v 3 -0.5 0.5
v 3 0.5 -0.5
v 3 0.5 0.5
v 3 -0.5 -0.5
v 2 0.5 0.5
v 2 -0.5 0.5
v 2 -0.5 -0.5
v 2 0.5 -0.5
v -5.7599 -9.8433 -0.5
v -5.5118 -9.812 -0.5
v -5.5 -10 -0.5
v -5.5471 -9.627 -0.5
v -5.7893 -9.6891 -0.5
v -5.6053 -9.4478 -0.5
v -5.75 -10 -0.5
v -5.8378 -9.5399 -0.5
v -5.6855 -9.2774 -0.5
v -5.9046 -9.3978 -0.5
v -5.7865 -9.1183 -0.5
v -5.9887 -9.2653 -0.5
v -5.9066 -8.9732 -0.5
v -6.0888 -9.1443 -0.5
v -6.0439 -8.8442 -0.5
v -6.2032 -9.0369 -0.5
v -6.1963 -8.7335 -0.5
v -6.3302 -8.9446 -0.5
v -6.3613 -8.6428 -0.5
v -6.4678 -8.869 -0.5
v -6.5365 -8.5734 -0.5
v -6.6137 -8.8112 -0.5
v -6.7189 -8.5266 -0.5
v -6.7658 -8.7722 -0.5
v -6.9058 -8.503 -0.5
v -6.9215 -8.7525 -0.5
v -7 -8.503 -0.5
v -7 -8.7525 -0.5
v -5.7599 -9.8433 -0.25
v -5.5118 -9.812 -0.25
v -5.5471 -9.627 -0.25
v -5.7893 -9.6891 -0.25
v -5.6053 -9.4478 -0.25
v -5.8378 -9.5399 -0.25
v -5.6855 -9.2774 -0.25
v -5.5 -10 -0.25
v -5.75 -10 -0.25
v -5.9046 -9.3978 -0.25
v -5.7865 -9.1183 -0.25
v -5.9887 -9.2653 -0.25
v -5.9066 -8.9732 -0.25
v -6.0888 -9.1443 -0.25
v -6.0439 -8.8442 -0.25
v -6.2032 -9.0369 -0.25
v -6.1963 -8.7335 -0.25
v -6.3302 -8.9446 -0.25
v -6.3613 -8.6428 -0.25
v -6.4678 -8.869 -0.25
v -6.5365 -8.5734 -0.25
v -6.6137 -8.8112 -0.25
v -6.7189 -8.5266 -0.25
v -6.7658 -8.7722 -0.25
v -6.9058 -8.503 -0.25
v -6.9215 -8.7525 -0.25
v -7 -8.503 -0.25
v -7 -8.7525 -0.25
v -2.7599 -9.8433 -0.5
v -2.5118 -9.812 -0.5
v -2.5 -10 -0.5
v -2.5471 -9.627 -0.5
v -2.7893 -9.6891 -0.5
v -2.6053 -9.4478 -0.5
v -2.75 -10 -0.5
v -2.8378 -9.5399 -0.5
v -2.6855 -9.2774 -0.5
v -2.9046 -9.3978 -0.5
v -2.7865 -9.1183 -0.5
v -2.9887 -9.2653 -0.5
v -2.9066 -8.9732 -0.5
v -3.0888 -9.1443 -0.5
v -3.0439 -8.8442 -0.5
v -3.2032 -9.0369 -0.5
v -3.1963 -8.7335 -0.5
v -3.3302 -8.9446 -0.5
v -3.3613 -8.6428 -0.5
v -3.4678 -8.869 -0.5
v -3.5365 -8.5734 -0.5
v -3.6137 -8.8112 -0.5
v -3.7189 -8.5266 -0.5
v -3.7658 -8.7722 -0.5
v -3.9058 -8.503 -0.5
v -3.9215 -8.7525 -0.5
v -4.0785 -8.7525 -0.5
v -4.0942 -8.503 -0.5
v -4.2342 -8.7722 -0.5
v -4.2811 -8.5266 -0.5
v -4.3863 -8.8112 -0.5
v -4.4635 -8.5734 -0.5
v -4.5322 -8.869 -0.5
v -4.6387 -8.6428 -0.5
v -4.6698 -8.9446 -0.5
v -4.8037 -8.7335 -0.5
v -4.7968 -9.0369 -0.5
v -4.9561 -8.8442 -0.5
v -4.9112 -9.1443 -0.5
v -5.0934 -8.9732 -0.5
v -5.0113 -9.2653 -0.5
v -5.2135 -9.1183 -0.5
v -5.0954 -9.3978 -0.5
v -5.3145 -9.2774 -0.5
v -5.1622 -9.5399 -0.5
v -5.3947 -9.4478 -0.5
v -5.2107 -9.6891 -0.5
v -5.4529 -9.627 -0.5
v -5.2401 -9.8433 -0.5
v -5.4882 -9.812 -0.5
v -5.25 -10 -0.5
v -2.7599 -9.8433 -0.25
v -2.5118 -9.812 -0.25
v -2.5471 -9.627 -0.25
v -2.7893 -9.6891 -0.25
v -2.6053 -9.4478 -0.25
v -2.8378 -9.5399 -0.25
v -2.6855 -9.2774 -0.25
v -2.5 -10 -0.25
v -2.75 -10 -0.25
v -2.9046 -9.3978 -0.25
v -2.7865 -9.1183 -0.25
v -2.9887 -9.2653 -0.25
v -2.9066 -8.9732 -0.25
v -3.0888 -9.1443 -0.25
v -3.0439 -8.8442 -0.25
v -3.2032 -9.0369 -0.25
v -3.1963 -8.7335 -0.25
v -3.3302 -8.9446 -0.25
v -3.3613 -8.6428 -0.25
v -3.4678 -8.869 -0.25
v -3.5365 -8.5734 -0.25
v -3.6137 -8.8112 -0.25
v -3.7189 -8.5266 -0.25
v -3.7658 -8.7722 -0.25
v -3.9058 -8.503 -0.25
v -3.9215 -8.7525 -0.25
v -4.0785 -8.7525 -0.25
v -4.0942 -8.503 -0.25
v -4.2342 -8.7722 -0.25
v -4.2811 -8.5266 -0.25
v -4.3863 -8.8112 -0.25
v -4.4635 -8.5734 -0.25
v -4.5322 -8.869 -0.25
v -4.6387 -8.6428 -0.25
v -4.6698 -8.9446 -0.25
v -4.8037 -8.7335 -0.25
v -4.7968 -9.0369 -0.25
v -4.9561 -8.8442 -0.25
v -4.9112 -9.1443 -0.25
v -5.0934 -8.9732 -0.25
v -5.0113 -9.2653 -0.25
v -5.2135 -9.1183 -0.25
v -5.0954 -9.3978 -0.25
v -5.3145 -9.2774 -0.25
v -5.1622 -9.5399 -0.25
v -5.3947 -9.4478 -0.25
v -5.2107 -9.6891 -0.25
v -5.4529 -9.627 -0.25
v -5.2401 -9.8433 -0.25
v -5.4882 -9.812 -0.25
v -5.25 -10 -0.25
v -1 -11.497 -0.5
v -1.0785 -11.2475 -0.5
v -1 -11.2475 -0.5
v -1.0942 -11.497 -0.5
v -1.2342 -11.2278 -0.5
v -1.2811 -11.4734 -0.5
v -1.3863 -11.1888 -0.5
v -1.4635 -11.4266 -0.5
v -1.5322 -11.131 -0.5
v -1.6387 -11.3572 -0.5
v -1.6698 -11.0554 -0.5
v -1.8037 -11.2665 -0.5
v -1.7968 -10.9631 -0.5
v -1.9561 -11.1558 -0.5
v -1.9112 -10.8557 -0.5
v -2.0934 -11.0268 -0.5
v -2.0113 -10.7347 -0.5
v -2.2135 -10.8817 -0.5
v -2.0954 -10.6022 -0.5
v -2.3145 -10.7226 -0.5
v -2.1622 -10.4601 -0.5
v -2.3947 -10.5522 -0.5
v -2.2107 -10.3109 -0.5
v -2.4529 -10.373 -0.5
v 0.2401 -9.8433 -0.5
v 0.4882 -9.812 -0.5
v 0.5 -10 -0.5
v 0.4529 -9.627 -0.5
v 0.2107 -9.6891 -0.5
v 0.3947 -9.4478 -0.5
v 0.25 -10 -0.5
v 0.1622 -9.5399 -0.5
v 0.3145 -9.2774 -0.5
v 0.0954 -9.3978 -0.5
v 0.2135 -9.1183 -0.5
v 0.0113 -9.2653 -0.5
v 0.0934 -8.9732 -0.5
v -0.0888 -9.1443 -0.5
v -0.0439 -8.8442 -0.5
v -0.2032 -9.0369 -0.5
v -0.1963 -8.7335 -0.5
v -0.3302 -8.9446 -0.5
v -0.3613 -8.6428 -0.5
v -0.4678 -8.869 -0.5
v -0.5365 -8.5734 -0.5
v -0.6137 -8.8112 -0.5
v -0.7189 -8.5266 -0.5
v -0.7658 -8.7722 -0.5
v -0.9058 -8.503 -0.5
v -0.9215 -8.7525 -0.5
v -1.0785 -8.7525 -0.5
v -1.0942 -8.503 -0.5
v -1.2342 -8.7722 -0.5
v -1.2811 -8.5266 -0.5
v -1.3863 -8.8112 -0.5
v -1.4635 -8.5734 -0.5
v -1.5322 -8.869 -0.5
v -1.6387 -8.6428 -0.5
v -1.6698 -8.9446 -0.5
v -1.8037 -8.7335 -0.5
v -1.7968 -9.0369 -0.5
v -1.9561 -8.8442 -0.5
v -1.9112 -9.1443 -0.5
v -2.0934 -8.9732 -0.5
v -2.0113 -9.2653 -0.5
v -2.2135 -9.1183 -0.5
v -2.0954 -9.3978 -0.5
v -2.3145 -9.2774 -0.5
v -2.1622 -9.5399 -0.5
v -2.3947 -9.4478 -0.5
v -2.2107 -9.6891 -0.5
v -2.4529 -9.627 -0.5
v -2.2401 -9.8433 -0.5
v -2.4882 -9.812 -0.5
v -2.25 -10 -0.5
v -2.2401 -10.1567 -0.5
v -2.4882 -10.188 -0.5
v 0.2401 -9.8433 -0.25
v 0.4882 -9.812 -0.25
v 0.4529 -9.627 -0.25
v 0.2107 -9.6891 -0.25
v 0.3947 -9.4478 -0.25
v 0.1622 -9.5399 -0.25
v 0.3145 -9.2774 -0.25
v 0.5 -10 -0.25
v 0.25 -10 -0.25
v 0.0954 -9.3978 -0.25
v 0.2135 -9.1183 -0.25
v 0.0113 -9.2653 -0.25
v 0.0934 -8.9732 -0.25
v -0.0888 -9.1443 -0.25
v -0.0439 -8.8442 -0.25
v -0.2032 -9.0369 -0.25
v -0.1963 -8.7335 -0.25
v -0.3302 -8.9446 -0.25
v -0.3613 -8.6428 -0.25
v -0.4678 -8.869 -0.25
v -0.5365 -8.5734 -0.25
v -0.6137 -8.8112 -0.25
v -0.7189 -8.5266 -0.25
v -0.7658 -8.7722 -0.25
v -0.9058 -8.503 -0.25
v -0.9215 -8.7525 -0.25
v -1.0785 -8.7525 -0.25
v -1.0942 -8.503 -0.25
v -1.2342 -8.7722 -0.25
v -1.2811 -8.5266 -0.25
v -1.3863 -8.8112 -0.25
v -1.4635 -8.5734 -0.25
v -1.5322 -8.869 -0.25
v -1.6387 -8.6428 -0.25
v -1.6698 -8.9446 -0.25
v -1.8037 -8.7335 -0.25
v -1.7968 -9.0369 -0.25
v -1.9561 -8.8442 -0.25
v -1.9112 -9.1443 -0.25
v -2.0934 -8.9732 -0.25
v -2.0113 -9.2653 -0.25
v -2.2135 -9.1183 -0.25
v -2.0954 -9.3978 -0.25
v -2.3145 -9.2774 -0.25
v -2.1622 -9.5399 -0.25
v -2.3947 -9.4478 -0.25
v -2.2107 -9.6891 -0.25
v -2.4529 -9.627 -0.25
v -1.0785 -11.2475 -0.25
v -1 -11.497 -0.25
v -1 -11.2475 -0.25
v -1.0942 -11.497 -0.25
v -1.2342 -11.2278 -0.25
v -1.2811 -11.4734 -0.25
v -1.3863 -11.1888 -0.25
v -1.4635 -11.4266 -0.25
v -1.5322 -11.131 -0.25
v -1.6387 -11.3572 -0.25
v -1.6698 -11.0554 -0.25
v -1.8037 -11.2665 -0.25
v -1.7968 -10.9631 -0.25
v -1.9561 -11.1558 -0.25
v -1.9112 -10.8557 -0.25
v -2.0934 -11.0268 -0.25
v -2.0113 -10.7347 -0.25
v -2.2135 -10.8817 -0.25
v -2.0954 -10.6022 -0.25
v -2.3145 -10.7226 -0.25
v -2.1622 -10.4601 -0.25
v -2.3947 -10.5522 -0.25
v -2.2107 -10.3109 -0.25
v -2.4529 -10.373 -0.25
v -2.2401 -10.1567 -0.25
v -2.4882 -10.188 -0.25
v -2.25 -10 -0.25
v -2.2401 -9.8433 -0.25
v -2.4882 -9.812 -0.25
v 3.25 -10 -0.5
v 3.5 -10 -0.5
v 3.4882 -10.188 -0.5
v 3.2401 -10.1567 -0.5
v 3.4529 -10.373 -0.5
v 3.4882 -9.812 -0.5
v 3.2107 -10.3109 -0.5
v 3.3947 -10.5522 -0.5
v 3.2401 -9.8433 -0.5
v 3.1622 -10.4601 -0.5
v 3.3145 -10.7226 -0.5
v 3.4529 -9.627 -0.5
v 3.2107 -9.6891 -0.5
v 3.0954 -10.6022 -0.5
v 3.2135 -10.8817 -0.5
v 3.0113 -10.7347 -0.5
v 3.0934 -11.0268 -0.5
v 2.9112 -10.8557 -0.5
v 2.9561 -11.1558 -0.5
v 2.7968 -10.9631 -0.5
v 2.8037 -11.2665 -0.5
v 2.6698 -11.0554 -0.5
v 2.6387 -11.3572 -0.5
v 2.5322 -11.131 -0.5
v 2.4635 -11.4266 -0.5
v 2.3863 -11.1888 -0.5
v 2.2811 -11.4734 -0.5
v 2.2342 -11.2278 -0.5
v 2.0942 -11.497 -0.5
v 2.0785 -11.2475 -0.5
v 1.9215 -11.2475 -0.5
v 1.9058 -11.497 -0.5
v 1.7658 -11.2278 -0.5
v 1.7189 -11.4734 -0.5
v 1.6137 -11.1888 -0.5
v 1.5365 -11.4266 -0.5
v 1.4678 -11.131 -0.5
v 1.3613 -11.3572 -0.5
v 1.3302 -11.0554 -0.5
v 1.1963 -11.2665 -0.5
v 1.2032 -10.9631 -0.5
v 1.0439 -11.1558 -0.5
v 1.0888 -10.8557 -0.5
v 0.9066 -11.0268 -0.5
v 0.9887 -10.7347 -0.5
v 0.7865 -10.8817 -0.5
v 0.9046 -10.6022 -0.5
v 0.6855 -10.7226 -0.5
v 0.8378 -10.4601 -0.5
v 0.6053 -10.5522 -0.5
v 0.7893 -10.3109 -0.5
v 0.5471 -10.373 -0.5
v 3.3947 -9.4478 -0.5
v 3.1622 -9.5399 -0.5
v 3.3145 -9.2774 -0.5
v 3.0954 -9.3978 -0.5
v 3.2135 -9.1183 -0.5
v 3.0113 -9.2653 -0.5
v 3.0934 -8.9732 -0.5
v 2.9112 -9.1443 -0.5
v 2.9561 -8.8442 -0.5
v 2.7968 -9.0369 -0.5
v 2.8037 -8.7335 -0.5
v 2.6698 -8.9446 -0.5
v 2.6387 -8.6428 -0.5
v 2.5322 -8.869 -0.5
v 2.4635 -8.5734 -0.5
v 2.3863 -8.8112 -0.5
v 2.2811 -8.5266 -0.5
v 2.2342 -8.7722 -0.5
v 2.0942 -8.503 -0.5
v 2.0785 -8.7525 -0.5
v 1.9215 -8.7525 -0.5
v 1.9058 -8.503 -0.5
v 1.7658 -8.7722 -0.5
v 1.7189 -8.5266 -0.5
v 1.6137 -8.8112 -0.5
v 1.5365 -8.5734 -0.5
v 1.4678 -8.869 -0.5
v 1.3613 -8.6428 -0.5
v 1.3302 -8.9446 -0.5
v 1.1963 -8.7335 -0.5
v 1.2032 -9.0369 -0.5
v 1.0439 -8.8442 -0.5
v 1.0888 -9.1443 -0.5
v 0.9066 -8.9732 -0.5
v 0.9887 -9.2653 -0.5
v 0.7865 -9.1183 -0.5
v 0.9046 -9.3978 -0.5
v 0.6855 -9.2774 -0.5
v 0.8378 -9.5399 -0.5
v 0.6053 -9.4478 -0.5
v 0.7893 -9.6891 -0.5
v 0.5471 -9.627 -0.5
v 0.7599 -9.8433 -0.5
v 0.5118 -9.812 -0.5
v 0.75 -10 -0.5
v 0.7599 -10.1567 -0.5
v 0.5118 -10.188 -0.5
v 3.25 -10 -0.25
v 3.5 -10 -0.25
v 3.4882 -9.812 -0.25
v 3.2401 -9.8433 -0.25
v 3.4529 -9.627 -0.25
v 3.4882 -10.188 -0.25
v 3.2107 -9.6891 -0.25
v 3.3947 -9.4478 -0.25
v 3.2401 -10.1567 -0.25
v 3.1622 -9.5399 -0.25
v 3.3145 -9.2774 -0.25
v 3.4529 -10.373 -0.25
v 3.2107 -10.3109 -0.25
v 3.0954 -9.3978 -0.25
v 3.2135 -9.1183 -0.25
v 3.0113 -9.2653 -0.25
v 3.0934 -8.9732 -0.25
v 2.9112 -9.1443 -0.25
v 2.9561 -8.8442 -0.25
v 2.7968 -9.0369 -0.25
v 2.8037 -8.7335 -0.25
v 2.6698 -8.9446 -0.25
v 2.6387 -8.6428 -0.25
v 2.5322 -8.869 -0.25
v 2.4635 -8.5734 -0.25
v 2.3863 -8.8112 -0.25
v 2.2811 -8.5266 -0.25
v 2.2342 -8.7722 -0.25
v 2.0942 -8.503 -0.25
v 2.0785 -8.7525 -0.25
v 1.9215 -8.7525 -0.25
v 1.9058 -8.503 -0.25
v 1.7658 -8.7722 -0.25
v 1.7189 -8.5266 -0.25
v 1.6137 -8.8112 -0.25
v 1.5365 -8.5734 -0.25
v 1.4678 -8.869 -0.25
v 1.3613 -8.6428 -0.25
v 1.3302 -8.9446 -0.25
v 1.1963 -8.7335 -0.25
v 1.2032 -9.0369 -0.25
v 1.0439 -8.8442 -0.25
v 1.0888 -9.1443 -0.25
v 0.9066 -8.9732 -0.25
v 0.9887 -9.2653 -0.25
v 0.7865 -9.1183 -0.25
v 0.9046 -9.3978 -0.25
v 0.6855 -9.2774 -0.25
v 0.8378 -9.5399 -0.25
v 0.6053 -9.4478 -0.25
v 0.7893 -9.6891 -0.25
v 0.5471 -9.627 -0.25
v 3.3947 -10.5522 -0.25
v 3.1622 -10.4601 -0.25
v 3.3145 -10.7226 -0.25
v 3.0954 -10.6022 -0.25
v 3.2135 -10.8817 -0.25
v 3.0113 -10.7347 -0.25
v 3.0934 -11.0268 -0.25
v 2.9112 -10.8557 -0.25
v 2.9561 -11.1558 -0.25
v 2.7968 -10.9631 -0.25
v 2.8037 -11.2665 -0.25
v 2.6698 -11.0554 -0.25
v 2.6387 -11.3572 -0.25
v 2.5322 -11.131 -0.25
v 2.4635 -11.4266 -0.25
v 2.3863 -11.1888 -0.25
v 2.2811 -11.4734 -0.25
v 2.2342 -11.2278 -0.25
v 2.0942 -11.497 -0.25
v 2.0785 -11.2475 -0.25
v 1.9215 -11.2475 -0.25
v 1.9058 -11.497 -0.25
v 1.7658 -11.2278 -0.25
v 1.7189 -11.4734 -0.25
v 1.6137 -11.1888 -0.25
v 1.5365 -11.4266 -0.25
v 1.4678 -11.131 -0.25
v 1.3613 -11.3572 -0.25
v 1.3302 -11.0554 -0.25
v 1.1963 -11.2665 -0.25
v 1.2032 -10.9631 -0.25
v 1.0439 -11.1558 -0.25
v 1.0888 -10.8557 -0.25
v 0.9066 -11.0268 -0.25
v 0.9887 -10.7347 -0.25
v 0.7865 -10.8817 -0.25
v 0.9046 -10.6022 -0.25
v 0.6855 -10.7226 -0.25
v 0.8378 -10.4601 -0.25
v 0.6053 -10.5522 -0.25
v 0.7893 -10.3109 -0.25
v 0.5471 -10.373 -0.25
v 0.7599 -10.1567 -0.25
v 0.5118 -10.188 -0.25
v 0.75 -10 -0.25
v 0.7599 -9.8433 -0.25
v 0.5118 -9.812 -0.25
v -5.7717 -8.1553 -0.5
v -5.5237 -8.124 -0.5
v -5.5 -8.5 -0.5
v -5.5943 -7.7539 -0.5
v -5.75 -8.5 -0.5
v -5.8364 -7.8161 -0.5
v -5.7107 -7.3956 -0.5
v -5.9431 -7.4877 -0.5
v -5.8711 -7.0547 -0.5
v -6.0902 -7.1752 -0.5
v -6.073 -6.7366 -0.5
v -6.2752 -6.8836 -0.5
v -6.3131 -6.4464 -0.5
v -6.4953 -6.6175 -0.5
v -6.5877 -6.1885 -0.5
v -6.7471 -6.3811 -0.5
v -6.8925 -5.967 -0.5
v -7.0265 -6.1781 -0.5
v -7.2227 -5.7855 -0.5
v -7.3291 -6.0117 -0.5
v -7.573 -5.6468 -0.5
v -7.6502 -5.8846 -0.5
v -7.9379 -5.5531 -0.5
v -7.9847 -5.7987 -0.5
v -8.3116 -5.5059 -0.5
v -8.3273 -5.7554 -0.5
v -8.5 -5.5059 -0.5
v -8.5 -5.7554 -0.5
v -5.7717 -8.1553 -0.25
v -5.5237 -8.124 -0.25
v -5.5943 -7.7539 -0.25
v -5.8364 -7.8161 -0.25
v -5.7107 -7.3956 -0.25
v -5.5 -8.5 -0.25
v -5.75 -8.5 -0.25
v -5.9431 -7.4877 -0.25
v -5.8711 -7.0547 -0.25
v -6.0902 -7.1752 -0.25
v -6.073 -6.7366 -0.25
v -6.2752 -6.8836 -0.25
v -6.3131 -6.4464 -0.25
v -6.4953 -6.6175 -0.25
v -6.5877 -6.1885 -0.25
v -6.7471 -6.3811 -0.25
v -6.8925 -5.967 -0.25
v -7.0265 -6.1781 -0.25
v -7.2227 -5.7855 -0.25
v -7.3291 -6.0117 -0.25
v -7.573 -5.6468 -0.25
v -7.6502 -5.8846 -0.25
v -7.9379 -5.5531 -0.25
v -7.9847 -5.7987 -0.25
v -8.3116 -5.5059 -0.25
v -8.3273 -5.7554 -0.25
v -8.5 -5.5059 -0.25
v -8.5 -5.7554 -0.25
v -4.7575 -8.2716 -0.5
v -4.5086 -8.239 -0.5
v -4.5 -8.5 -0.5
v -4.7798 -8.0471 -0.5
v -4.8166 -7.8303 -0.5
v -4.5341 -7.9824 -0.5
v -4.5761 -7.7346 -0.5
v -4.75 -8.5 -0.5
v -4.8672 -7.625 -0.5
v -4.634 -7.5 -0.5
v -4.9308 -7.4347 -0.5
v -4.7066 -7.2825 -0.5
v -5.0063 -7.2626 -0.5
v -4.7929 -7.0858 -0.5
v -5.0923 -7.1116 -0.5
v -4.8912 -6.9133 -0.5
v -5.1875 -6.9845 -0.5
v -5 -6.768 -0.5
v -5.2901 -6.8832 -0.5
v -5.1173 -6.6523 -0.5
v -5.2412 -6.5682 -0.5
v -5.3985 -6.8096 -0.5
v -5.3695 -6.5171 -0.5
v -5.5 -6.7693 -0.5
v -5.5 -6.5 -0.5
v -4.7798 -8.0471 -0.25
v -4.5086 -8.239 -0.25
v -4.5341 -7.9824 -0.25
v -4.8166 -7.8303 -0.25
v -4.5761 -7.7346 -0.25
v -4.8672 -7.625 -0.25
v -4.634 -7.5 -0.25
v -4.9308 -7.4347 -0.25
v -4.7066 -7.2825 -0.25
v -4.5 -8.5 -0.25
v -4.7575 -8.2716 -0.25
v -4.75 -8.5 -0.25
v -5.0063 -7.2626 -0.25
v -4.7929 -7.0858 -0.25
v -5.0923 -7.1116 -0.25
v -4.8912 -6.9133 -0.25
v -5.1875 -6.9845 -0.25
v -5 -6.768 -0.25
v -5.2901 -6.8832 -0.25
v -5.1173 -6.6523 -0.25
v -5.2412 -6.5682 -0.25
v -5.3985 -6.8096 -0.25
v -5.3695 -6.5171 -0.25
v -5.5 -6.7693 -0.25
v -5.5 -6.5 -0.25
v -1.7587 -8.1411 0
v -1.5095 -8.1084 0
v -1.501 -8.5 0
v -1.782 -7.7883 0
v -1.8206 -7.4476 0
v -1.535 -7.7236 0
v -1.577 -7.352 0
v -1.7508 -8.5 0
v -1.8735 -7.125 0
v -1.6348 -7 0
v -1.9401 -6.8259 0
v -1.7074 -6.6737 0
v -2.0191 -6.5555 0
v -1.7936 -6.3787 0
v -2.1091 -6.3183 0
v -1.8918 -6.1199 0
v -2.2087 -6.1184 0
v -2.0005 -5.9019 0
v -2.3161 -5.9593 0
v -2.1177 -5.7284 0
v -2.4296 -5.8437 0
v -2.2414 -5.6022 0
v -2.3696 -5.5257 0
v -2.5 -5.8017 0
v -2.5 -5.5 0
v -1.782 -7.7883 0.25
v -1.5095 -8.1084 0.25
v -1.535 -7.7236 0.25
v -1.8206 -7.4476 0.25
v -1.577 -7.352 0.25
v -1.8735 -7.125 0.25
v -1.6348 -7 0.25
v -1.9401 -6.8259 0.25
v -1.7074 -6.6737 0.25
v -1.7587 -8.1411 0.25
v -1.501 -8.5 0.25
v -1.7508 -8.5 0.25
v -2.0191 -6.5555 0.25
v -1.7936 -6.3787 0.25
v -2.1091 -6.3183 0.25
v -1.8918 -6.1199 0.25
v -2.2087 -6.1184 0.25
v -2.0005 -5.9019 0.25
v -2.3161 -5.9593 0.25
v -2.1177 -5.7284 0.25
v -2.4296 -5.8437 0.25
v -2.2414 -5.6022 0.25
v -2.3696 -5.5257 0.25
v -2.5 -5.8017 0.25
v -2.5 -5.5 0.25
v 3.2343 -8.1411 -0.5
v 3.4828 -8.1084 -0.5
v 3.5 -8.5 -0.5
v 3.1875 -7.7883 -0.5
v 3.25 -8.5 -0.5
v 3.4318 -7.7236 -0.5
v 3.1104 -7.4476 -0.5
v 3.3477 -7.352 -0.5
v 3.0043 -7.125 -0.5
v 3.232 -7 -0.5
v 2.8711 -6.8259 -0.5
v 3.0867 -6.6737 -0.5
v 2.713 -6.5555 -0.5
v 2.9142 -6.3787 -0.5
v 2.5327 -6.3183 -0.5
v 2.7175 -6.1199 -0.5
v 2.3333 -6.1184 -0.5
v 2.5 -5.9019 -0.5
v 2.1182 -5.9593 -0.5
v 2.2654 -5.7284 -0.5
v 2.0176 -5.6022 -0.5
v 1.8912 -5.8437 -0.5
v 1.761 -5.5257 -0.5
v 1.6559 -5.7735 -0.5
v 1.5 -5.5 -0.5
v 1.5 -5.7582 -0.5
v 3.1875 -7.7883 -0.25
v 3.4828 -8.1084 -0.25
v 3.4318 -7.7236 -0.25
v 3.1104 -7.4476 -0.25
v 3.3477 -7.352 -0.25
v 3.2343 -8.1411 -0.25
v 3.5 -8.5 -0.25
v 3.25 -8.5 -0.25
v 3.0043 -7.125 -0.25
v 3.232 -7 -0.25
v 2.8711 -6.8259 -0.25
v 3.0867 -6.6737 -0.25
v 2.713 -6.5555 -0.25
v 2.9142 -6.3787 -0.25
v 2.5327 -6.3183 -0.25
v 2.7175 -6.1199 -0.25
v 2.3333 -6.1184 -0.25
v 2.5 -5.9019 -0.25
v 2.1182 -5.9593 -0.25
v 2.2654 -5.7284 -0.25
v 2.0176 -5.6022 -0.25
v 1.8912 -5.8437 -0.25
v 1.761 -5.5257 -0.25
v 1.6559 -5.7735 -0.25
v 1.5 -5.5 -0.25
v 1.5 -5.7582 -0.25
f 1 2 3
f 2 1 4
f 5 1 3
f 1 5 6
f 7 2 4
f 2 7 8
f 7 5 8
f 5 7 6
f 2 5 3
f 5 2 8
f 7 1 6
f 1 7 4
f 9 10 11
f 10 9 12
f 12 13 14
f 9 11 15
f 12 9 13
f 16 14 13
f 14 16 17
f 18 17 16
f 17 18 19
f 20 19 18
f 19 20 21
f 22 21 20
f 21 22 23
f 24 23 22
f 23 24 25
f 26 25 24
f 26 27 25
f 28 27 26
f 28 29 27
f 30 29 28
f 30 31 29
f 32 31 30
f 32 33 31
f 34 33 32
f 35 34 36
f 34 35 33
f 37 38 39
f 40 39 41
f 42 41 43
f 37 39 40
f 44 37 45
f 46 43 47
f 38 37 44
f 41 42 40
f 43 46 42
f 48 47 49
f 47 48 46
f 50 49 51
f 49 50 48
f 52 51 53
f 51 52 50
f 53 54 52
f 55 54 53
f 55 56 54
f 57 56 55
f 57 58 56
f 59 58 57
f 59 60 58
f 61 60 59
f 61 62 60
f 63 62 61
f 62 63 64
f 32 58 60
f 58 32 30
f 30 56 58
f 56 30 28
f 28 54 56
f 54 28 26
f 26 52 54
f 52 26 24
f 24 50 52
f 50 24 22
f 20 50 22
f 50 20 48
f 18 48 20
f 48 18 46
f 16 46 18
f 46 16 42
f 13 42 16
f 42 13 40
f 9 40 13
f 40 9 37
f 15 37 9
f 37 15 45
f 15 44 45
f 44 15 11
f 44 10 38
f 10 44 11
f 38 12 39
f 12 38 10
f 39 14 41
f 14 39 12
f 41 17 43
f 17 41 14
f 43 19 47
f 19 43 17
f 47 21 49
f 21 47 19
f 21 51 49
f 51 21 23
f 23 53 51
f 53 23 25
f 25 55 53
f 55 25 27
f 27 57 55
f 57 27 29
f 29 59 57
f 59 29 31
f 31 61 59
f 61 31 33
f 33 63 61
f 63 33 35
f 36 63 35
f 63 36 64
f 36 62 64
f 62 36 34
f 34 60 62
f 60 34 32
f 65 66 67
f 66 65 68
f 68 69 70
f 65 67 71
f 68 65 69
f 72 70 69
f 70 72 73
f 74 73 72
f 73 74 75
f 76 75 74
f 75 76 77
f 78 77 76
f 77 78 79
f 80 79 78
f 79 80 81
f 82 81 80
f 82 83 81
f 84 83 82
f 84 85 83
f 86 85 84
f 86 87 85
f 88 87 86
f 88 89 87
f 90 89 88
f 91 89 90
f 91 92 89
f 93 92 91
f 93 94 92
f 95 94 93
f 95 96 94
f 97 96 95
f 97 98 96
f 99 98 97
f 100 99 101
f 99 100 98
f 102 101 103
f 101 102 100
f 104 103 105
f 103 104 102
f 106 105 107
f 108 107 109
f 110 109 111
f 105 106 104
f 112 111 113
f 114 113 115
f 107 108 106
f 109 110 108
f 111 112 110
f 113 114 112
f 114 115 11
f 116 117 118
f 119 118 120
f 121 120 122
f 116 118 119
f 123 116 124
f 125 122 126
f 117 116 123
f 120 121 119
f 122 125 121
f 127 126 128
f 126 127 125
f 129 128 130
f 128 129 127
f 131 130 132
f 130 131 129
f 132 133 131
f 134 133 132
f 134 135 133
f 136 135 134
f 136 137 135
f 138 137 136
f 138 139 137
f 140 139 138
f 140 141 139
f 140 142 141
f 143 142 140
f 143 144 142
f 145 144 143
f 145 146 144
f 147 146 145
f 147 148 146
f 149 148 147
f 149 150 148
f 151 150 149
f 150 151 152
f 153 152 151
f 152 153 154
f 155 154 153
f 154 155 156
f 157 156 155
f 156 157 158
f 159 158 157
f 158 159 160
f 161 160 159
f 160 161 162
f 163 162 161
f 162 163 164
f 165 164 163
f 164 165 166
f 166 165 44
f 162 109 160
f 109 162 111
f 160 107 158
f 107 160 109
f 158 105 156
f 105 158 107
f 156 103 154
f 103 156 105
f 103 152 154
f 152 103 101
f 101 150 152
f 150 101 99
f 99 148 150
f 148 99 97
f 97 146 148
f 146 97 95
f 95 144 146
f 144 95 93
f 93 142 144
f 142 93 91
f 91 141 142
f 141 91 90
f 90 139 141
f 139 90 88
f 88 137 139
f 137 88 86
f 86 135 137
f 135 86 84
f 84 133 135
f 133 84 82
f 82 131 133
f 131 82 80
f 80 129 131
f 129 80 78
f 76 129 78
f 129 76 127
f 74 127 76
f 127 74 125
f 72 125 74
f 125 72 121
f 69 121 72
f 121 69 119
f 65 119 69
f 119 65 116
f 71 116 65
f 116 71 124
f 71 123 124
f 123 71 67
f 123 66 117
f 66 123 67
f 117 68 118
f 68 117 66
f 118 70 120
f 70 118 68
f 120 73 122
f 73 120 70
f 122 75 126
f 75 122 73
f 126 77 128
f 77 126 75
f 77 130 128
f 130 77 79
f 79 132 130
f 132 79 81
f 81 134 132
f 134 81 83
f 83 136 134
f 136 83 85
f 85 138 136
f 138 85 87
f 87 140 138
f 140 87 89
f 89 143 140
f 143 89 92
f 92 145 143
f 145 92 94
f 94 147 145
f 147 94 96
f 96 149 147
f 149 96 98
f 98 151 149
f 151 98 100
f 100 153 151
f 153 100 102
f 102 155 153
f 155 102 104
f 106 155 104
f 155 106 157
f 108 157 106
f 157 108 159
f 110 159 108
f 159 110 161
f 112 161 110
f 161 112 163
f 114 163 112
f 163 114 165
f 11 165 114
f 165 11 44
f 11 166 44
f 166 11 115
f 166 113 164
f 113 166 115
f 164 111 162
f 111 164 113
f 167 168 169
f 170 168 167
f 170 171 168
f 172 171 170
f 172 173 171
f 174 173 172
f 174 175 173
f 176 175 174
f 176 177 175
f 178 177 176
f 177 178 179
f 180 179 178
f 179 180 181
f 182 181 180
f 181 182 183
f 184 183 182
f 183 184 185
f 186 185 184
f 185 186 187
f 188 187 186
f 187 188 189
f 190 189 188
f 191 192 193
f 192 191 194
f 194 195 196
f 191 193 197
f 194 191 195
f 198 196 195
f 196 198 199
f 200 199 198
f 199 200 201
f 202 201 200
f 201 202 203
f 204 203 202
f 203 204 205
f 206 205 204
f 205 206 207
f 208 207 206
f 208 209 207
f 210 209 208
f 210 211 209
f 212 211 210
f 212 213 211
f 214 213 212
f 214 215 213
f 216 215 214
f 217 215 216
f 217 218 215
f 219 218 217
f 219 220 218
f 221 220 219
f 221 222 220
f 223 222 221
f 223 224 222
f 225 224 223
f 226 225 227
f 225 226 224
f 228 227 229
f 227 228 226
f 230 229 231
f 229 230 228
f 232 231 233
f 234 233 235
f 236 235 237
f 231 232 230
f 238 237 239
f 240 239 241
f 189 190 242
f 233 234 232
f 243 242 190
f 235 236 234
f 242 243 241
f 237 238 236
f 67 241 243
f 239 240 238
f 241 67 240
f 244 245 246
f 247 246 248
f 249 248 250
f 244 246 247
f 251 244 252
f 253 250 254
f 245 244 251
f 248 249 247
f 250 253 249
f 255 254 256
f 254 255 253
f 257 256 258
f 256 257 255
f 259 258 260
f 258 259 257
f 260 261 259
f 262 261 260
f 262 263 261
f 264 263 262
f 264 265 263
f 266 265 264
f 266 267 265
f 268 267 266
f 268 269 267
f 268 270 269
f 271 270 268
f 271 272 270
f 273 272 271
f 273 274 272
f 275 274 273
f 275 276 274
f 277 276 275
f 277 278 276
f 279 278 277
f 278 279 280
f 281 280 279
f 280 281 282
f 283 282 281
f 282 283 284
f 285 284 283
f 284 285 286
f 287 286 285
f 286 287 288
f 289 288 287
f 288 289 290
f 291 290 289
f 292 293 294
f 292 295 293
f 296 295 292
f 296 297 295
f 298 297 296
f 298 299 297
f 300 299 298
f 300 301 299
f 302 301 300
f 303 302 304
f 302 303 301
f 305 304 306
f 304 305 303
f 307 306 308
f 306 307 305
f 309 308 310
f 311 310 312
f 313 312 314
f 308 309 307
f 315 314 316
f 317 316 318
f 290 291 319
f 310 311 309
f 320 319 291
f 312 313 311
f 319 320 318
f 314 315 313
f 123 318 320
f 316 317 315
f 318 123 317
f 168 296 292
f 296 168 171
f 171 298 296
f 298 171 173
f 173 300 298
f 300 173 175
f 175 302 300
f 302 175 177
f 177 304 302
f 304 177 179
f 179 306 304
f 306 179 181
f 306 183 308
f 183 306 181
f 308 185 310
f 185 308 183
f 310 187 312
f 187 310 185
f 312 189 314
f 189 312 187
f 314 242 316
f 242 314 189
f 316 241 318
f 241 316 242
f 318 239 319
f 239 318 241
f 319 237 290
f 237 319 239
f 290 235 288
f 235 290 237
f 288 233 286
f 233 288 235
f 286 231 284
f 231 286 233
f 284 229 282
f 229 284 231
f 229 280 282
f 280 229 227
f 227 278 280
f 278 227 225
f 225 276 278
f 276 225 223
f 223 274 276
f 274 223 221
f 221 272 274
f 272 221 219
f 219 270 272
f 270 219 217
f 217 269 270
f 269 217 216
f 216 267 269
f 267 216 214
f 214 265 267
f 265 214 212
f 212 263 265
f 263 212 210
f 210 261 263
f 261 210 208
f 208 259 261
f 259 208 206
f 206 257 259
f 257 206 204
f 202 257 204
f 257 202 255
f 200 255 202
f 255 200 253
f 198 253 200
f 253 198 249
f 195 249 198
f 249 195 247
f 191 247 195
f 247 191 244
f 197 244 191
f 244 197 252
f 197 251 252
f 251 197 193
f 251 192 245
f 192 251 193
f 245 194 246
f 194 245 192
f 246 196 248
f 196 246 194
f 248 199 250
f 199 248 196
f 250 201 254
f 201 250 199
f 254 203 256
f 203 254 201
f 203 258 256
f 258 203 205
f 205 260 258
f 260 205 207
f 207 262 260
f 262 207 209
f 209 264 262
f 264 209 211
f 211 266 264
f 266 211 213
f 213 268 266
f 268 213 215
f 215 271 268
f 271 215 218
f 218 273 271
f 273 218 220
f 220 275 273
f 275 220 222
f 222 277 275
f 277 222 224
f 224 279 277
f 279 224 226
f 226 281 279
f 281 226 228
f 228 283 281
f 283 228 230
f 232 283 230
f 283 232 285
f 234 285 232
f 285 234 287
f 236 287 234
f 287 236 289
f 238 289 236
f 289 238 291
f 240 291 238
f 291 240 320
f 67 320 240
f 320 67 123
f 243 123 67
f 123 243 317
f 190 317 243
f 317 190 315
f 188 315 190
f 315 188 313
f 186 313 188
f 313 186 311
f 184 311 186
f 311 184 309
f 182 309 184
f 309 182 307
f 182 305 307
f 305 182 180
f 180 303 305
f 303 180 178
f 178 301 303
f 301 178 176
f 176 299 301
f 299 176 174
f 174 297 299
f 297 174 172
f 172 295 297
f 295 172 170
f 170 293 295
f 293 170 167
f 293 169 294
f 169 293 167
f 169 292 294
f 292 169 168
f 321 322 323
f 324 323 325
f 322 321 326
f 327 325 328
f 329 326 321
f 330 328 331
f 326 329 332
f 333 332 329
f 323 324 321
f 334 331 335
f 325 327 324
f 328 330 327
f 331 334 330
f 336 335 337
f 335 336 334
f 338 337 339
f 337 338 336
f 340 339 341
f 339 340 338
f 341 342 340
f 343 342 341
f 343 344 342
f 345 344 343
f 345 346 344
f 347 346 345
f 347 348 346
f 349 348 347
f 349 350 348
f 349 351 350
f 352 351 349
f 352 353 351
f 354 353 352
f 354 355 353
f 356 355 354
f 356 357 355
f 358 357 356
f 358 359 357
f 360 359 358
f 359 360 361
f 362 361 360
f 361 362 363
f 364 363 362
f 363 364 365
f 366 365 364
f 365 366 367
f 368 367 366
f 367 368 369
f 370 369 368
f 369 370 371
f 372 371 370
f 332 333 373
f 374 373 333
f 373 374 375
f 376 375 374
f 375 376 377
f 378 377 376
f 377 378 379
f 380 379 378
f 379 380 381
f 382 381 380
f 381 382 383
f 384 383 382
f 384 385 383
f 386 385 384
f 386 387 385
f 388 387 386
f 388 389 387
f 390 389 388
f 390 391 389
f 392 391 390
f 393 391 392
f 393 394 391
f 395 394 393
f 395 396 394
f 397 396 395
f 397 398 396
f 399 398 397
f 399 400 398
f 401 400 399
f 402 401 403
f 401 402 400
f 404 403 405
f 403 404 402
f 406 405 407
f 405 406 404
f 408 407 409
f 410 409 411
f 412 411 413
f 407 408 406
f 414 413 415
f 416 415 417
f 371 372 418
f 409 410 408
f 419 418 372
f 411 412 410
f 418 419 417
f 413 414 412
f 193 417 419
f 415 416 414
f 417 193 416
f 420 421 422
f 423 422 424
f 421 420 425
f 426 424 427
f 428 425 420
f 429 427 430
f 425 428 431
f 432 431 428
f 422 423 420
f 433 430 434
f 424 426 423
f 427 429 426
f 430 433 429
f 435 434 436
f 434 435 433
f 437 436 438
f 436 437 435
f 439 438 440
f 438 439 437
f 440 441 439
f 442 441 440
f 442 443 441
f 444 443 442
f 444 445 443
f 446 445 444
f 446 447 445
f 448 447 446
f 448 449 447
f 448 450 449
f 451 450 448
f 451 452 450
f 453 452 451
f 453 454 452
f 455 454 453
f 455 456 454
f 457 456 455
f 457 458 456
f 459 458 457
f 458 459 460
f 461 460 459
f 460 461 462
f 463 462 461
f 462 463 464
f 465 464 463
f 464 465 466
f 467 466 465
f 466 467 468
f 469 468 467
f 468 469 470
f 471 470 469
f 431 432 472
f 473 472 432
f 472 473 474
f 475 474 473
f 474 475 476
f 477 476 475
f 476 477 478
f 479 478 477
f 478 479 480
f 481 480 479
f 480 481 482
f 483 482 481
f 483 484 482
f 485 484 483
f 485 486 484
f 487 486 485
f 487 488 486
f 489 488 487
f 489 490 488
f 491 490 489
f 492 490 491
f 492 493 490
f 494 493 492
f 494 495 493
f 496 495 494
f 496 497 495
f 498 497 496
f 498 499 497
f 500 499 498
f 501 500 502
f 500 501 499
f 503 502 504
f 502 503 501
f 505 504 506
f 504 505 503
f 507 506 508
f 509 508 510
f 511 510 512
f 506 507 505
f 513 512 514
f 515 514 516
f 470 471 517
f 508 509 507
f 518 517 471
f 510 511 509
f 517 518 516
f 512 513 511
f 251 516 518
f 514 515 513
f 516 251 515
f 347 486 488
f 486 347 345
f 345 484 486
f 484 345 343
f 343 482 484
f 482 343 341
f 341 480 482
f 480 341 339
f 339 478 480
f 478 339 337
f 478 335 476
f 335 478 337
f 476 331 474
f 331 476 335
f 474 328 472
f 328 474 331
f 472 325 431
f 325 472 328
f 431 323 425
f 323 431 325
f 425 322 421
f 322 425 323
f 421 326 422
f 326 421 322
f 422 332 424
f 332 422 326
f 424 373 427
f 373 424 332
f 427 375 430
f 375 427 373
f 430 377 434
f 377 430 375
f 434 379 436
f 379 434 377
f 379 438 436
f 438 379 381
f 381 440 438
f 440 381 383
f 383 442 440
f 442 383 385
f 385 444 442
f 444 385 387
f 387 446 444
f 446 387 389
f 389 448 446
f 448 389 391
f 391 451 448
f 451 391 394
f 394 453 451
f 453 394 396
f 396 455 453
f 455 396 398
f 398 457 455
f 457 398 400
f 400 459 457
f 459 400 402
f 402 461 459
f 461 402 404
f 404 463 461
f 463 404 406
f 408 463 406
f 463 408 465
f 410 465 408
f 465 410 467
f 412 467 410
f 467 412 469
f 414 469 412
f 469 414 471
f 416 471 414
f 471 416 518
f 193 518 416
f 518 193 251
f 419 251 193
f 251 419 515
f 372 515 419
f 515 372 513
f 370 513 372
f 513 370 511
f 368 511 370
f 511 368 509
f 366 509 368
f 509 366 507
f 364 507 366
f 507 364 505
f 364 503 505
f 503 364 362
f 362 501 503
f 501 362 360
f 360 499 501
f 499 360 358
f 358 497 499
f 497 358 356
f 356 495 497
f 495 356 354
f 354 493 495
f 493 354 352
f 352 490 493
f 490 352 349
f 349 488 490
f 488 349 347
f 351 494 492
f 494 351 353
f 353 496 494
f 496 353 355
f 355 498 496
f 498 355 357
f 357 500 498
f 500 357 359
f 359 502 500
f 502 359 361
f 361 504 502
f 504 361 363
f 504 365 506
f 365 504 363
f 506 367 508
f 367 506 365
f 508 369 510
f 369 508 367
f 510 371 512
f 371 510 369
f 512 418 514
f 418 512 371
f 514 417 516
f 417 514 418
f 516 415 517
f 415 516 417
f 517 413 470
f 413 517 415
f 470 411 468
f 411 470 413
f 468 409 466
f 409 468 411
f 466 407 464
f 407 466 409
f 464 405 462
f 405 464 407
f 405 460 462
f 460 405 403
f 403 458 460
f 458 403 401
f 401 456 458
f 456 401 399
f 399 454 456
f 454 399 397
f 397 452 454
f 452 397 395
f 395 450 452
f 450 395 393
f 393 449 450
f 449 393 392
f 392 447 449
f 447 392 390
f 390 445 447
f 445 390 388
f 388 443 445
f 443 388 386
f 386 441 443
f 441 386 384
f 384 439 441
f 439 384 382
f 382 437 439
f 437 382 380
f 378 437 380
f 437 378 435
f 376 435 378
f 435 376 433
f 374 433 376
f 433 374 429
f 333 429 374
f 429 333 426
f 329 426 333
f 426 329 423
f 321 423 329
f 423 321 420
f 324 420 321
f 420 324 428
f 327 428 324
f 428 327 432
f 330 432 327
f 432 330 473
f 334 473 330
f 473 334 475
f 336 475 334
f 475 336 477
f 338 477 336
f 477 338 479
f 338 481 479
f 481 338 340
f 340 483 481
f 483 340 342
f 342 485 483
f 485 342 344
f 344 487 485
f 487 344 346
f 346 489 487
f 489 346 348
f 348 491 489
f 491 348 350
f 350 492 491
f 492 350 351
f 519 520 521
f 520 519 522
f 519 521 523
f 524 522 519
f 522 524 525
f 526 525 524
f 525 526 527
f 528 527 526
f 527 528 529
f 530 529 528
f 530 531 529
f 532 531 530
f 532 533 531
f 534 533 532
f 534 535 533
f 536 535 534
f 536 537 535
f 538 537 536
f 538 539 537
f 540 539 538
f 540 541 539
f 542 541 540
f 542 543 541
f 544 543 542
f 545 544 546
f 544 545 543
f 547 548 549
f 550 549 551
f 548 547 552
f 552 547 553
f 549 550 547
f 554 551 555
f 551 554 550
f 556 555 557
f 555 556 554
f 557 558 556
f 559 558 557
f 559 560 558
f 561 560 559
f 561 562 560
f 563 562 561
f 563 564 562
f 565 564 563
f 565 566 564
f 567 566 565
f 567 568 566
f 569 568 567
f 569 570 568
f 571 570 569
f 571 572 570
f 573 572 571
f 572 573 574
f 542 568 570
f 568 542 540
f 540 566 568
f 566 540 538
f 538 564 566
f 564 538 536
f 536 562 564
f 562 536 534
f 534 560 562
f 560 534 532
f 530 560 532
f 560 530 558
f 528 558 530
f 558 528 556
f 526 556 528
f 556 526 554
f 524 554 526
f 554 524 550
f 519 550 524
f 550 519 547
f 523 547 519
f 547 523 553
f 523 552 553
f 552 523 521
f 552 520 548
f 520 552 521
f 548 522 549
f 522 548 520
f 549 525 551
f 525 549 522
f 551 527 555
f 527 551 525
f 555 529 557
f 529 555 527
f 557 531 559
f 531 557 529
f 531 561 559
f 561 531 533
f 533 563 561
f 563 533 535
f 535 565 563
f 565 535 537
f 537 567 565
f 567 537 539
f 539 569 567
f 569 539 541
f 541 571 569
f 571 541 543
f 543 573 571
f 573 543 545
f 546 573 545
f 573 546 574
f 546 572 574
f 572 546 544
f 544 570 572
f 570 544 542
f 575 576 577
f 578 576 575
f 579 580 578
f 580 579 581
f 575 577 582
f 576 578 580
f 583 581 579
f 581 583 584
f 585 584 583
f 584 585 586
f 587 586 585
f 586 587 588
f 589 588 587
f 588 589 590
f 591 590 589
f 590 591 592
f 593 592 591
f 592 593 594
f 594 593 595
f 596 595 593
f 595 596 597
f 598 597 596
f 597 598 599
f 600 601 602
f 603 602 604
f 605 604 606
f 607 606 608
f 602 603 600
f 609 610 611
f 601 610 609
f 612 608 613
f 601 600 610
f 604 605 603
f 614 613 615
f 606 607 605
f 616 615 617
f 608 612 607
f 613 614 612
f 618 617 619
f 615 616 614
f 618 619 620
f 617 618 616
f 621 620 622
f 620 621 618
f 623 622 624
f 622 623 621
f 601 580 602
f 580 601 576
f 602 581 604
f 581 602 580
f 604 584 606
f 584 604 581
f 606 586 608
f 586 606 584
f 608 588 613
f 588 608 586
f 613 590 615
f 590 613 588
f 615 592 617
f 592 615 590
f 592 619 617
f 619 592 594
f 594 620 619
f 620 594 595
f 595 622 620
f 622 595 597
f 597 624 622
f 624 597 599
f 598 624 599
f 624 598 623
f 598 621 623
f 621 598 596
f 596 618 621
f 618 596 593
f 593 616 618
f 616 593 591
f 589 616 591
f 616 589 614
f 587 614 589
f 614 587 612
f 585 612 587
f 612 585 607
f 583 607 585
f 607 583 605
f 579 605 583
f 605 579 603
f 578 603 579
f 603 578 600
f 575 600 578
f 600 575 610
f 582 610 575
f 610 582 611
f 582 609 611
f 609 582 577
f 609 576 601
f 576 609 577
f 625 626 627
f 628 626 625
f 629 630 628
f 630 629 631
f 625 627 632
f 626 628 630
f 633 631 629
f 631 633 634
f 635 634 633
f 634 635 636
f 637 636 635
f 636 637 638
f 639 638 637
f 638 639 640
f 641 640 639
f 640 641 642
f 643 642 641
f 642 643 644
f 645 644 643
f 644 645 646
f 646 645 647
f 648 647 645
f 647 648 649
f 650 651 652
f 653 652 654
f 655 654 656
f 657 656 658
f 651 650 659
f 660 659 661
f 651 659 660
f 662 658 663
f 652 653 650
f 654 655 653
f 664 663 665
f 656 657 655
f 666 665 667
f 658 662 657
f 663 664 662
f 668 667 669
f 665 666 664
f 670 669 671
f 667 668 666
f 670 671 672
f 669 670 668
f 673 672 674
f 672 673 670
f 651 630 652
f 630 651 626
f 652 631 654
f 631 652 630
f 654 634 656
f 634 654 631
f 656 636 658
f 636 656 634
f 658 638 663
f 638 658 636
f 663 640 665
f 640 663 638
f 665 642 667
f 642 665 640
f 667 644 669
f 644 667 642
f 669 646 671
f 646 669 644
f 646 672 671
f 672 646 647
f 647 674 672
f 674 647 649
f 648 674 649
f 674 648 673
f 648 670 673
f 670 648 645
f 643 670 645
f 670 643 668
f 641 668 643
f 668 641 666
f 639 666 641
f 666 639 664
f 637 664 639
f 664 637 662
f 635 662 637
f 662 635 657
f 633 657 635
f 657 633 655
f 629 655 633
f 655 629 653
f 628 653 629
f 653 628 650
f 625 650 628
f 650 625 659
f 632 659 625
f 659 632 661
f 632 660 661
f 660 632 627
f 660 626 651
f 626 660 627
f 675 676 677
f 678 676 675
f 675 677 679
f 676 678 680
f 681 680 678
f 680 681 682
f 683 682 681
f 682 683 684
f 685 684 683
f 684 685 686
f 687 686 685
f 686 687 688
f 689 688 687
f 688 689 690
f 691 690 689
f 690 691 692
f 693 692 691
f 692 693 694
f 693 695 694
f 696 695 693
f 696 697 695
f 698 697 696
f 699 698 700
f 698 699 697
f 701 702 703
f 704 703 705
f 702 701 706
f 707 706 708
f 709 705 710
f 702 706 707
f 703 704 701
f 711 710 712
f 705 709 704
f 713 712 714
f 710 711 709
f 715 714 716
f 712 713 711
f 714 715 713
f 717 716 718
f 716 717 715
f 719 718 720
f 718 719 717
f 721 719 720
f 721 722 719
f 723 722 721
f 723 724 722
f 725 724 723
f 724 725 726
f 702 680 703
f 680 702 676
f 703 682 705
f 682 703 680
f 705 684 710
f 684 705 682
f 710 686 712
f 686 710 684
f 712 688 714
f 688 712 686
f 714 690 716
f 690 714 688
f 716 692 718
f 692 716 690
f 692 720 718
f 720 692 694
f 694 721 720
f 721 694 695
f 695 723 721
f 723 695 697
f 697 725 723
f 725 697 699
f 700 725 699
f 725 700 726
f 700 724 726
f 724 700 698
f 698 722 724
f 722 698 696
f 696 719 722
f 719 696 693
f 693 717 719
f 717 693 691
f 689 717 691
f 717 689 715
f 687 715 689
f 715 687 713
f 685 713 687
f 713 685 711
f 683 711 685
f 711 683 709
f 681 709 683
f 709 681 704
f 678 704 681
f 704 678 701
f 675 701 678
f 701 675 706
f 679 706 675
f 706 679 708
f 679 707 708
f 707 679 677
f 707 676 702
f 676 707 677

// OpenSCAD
// Curve Writing Parametric Module
// https://openhome.cc/eGossip/OpenSCAD/SectorArc.html
// Single module, executes all the functionality for most
$fa=0.1; $fs=0.1;

//example node drawn for scale:
color("blue")
    translate([2,-0.5,-0.5])
        cube(1,1,1);

module curve90(Lscale,Wscale, height) {
    resize([Lscale,0,Wscale])   
        cylinder(height, 1,1, false);
}

module sector(radius, angles, fn = 24) {
    r = radius / cos(180 / fn);
    step = -360 / fn;

    points = concat([[0, 0]],
        [for(a = [angles[0] : step : angles[1] - 360]) 
            [r * cos(a), r * sin(a)]
        ],
        [[r * cos(angles[1]), r * sin(angles[1])]]
    );

    difference() {
        circle(radius, $fn = fn);
        polygon(points);
    }
}



module arc(radius, angles, width = 1, fn = 24) {
    difference() {
        sector(radius + width, angles, fn);
        sector(radius, angles, fn);
    }
}
//2x2 90
translate([-7,-10,-0.5])
scale([1,1,1])
linear_extrude(1/4)
    arc(1.25, [0,90], 0.25, 50);

//2x2 180
translate([-4,-10,-0.5])
scale([1,1,1])
linear_extrude(1/4)
    arc(1.25, [0,180], 0.25, 50);

//2x2 270
translate([-1,-10,-0.5])
scale([1,1,1])
linear_extrude(1/4)
    arc(1.25, [0,270], 0.25, 50);

//2x2 360
translate([2,-10,-0.5])
scale([1,1,1])
linear_extrude(1/4)
    arc(1.25, [0,360], 0.25, 50);
    
//3x3 90 --Note the -1.5 offsets for x,z
translate([(-1.5)-7,(-1.5)-7,-0.5])
scale([1,1,1])
linear_extrude(1/4)
    arc(3-0.25, [0,90], 0.25, 50);

//1x2 90
translate([0,0,-0.5])
linear_extrude(1/4)
difference() {
translate([(-1.5)-4,(-1.5)-7,-0.5])
scale([0.5,1,1])
    sector(2, [0, 90], 48);

color("blue")
translate([(-1.5-0.125)-4,(-1.5)-7,-0.5])
scale([0.5,1,1])
    sector(1.75, [0, 90], 48);
};

//1x2 90
linear_extrude(1/4)
difference() {
translate([(-1.5)-1,(-1.5)-7,-0.5])
scale([0.333,1,1])
    sector(3, [0, 90], 48);

color("blue")
translate([(-1.5-0.1666)-1,(-1.5)-7,-0.5])
scale([0.333,1,1])
    sector(2.75, [0, 90], 48);
};

//2x3 90
translate([0,0,-0.5])
linear_extrude(1/4)
difference() {
translate([(-1.5)+3,(-1.5)-7,-0.5])
scale([0.66666,1,1])
    sector(3, [0, 90], 48);

color("blue")
translate([(-1.5-0.083333)+3,(-1.5)-7,-0.5])
scale([0.66666,1,1])
    sector(2.75, [0, 90], 48);
};
    
